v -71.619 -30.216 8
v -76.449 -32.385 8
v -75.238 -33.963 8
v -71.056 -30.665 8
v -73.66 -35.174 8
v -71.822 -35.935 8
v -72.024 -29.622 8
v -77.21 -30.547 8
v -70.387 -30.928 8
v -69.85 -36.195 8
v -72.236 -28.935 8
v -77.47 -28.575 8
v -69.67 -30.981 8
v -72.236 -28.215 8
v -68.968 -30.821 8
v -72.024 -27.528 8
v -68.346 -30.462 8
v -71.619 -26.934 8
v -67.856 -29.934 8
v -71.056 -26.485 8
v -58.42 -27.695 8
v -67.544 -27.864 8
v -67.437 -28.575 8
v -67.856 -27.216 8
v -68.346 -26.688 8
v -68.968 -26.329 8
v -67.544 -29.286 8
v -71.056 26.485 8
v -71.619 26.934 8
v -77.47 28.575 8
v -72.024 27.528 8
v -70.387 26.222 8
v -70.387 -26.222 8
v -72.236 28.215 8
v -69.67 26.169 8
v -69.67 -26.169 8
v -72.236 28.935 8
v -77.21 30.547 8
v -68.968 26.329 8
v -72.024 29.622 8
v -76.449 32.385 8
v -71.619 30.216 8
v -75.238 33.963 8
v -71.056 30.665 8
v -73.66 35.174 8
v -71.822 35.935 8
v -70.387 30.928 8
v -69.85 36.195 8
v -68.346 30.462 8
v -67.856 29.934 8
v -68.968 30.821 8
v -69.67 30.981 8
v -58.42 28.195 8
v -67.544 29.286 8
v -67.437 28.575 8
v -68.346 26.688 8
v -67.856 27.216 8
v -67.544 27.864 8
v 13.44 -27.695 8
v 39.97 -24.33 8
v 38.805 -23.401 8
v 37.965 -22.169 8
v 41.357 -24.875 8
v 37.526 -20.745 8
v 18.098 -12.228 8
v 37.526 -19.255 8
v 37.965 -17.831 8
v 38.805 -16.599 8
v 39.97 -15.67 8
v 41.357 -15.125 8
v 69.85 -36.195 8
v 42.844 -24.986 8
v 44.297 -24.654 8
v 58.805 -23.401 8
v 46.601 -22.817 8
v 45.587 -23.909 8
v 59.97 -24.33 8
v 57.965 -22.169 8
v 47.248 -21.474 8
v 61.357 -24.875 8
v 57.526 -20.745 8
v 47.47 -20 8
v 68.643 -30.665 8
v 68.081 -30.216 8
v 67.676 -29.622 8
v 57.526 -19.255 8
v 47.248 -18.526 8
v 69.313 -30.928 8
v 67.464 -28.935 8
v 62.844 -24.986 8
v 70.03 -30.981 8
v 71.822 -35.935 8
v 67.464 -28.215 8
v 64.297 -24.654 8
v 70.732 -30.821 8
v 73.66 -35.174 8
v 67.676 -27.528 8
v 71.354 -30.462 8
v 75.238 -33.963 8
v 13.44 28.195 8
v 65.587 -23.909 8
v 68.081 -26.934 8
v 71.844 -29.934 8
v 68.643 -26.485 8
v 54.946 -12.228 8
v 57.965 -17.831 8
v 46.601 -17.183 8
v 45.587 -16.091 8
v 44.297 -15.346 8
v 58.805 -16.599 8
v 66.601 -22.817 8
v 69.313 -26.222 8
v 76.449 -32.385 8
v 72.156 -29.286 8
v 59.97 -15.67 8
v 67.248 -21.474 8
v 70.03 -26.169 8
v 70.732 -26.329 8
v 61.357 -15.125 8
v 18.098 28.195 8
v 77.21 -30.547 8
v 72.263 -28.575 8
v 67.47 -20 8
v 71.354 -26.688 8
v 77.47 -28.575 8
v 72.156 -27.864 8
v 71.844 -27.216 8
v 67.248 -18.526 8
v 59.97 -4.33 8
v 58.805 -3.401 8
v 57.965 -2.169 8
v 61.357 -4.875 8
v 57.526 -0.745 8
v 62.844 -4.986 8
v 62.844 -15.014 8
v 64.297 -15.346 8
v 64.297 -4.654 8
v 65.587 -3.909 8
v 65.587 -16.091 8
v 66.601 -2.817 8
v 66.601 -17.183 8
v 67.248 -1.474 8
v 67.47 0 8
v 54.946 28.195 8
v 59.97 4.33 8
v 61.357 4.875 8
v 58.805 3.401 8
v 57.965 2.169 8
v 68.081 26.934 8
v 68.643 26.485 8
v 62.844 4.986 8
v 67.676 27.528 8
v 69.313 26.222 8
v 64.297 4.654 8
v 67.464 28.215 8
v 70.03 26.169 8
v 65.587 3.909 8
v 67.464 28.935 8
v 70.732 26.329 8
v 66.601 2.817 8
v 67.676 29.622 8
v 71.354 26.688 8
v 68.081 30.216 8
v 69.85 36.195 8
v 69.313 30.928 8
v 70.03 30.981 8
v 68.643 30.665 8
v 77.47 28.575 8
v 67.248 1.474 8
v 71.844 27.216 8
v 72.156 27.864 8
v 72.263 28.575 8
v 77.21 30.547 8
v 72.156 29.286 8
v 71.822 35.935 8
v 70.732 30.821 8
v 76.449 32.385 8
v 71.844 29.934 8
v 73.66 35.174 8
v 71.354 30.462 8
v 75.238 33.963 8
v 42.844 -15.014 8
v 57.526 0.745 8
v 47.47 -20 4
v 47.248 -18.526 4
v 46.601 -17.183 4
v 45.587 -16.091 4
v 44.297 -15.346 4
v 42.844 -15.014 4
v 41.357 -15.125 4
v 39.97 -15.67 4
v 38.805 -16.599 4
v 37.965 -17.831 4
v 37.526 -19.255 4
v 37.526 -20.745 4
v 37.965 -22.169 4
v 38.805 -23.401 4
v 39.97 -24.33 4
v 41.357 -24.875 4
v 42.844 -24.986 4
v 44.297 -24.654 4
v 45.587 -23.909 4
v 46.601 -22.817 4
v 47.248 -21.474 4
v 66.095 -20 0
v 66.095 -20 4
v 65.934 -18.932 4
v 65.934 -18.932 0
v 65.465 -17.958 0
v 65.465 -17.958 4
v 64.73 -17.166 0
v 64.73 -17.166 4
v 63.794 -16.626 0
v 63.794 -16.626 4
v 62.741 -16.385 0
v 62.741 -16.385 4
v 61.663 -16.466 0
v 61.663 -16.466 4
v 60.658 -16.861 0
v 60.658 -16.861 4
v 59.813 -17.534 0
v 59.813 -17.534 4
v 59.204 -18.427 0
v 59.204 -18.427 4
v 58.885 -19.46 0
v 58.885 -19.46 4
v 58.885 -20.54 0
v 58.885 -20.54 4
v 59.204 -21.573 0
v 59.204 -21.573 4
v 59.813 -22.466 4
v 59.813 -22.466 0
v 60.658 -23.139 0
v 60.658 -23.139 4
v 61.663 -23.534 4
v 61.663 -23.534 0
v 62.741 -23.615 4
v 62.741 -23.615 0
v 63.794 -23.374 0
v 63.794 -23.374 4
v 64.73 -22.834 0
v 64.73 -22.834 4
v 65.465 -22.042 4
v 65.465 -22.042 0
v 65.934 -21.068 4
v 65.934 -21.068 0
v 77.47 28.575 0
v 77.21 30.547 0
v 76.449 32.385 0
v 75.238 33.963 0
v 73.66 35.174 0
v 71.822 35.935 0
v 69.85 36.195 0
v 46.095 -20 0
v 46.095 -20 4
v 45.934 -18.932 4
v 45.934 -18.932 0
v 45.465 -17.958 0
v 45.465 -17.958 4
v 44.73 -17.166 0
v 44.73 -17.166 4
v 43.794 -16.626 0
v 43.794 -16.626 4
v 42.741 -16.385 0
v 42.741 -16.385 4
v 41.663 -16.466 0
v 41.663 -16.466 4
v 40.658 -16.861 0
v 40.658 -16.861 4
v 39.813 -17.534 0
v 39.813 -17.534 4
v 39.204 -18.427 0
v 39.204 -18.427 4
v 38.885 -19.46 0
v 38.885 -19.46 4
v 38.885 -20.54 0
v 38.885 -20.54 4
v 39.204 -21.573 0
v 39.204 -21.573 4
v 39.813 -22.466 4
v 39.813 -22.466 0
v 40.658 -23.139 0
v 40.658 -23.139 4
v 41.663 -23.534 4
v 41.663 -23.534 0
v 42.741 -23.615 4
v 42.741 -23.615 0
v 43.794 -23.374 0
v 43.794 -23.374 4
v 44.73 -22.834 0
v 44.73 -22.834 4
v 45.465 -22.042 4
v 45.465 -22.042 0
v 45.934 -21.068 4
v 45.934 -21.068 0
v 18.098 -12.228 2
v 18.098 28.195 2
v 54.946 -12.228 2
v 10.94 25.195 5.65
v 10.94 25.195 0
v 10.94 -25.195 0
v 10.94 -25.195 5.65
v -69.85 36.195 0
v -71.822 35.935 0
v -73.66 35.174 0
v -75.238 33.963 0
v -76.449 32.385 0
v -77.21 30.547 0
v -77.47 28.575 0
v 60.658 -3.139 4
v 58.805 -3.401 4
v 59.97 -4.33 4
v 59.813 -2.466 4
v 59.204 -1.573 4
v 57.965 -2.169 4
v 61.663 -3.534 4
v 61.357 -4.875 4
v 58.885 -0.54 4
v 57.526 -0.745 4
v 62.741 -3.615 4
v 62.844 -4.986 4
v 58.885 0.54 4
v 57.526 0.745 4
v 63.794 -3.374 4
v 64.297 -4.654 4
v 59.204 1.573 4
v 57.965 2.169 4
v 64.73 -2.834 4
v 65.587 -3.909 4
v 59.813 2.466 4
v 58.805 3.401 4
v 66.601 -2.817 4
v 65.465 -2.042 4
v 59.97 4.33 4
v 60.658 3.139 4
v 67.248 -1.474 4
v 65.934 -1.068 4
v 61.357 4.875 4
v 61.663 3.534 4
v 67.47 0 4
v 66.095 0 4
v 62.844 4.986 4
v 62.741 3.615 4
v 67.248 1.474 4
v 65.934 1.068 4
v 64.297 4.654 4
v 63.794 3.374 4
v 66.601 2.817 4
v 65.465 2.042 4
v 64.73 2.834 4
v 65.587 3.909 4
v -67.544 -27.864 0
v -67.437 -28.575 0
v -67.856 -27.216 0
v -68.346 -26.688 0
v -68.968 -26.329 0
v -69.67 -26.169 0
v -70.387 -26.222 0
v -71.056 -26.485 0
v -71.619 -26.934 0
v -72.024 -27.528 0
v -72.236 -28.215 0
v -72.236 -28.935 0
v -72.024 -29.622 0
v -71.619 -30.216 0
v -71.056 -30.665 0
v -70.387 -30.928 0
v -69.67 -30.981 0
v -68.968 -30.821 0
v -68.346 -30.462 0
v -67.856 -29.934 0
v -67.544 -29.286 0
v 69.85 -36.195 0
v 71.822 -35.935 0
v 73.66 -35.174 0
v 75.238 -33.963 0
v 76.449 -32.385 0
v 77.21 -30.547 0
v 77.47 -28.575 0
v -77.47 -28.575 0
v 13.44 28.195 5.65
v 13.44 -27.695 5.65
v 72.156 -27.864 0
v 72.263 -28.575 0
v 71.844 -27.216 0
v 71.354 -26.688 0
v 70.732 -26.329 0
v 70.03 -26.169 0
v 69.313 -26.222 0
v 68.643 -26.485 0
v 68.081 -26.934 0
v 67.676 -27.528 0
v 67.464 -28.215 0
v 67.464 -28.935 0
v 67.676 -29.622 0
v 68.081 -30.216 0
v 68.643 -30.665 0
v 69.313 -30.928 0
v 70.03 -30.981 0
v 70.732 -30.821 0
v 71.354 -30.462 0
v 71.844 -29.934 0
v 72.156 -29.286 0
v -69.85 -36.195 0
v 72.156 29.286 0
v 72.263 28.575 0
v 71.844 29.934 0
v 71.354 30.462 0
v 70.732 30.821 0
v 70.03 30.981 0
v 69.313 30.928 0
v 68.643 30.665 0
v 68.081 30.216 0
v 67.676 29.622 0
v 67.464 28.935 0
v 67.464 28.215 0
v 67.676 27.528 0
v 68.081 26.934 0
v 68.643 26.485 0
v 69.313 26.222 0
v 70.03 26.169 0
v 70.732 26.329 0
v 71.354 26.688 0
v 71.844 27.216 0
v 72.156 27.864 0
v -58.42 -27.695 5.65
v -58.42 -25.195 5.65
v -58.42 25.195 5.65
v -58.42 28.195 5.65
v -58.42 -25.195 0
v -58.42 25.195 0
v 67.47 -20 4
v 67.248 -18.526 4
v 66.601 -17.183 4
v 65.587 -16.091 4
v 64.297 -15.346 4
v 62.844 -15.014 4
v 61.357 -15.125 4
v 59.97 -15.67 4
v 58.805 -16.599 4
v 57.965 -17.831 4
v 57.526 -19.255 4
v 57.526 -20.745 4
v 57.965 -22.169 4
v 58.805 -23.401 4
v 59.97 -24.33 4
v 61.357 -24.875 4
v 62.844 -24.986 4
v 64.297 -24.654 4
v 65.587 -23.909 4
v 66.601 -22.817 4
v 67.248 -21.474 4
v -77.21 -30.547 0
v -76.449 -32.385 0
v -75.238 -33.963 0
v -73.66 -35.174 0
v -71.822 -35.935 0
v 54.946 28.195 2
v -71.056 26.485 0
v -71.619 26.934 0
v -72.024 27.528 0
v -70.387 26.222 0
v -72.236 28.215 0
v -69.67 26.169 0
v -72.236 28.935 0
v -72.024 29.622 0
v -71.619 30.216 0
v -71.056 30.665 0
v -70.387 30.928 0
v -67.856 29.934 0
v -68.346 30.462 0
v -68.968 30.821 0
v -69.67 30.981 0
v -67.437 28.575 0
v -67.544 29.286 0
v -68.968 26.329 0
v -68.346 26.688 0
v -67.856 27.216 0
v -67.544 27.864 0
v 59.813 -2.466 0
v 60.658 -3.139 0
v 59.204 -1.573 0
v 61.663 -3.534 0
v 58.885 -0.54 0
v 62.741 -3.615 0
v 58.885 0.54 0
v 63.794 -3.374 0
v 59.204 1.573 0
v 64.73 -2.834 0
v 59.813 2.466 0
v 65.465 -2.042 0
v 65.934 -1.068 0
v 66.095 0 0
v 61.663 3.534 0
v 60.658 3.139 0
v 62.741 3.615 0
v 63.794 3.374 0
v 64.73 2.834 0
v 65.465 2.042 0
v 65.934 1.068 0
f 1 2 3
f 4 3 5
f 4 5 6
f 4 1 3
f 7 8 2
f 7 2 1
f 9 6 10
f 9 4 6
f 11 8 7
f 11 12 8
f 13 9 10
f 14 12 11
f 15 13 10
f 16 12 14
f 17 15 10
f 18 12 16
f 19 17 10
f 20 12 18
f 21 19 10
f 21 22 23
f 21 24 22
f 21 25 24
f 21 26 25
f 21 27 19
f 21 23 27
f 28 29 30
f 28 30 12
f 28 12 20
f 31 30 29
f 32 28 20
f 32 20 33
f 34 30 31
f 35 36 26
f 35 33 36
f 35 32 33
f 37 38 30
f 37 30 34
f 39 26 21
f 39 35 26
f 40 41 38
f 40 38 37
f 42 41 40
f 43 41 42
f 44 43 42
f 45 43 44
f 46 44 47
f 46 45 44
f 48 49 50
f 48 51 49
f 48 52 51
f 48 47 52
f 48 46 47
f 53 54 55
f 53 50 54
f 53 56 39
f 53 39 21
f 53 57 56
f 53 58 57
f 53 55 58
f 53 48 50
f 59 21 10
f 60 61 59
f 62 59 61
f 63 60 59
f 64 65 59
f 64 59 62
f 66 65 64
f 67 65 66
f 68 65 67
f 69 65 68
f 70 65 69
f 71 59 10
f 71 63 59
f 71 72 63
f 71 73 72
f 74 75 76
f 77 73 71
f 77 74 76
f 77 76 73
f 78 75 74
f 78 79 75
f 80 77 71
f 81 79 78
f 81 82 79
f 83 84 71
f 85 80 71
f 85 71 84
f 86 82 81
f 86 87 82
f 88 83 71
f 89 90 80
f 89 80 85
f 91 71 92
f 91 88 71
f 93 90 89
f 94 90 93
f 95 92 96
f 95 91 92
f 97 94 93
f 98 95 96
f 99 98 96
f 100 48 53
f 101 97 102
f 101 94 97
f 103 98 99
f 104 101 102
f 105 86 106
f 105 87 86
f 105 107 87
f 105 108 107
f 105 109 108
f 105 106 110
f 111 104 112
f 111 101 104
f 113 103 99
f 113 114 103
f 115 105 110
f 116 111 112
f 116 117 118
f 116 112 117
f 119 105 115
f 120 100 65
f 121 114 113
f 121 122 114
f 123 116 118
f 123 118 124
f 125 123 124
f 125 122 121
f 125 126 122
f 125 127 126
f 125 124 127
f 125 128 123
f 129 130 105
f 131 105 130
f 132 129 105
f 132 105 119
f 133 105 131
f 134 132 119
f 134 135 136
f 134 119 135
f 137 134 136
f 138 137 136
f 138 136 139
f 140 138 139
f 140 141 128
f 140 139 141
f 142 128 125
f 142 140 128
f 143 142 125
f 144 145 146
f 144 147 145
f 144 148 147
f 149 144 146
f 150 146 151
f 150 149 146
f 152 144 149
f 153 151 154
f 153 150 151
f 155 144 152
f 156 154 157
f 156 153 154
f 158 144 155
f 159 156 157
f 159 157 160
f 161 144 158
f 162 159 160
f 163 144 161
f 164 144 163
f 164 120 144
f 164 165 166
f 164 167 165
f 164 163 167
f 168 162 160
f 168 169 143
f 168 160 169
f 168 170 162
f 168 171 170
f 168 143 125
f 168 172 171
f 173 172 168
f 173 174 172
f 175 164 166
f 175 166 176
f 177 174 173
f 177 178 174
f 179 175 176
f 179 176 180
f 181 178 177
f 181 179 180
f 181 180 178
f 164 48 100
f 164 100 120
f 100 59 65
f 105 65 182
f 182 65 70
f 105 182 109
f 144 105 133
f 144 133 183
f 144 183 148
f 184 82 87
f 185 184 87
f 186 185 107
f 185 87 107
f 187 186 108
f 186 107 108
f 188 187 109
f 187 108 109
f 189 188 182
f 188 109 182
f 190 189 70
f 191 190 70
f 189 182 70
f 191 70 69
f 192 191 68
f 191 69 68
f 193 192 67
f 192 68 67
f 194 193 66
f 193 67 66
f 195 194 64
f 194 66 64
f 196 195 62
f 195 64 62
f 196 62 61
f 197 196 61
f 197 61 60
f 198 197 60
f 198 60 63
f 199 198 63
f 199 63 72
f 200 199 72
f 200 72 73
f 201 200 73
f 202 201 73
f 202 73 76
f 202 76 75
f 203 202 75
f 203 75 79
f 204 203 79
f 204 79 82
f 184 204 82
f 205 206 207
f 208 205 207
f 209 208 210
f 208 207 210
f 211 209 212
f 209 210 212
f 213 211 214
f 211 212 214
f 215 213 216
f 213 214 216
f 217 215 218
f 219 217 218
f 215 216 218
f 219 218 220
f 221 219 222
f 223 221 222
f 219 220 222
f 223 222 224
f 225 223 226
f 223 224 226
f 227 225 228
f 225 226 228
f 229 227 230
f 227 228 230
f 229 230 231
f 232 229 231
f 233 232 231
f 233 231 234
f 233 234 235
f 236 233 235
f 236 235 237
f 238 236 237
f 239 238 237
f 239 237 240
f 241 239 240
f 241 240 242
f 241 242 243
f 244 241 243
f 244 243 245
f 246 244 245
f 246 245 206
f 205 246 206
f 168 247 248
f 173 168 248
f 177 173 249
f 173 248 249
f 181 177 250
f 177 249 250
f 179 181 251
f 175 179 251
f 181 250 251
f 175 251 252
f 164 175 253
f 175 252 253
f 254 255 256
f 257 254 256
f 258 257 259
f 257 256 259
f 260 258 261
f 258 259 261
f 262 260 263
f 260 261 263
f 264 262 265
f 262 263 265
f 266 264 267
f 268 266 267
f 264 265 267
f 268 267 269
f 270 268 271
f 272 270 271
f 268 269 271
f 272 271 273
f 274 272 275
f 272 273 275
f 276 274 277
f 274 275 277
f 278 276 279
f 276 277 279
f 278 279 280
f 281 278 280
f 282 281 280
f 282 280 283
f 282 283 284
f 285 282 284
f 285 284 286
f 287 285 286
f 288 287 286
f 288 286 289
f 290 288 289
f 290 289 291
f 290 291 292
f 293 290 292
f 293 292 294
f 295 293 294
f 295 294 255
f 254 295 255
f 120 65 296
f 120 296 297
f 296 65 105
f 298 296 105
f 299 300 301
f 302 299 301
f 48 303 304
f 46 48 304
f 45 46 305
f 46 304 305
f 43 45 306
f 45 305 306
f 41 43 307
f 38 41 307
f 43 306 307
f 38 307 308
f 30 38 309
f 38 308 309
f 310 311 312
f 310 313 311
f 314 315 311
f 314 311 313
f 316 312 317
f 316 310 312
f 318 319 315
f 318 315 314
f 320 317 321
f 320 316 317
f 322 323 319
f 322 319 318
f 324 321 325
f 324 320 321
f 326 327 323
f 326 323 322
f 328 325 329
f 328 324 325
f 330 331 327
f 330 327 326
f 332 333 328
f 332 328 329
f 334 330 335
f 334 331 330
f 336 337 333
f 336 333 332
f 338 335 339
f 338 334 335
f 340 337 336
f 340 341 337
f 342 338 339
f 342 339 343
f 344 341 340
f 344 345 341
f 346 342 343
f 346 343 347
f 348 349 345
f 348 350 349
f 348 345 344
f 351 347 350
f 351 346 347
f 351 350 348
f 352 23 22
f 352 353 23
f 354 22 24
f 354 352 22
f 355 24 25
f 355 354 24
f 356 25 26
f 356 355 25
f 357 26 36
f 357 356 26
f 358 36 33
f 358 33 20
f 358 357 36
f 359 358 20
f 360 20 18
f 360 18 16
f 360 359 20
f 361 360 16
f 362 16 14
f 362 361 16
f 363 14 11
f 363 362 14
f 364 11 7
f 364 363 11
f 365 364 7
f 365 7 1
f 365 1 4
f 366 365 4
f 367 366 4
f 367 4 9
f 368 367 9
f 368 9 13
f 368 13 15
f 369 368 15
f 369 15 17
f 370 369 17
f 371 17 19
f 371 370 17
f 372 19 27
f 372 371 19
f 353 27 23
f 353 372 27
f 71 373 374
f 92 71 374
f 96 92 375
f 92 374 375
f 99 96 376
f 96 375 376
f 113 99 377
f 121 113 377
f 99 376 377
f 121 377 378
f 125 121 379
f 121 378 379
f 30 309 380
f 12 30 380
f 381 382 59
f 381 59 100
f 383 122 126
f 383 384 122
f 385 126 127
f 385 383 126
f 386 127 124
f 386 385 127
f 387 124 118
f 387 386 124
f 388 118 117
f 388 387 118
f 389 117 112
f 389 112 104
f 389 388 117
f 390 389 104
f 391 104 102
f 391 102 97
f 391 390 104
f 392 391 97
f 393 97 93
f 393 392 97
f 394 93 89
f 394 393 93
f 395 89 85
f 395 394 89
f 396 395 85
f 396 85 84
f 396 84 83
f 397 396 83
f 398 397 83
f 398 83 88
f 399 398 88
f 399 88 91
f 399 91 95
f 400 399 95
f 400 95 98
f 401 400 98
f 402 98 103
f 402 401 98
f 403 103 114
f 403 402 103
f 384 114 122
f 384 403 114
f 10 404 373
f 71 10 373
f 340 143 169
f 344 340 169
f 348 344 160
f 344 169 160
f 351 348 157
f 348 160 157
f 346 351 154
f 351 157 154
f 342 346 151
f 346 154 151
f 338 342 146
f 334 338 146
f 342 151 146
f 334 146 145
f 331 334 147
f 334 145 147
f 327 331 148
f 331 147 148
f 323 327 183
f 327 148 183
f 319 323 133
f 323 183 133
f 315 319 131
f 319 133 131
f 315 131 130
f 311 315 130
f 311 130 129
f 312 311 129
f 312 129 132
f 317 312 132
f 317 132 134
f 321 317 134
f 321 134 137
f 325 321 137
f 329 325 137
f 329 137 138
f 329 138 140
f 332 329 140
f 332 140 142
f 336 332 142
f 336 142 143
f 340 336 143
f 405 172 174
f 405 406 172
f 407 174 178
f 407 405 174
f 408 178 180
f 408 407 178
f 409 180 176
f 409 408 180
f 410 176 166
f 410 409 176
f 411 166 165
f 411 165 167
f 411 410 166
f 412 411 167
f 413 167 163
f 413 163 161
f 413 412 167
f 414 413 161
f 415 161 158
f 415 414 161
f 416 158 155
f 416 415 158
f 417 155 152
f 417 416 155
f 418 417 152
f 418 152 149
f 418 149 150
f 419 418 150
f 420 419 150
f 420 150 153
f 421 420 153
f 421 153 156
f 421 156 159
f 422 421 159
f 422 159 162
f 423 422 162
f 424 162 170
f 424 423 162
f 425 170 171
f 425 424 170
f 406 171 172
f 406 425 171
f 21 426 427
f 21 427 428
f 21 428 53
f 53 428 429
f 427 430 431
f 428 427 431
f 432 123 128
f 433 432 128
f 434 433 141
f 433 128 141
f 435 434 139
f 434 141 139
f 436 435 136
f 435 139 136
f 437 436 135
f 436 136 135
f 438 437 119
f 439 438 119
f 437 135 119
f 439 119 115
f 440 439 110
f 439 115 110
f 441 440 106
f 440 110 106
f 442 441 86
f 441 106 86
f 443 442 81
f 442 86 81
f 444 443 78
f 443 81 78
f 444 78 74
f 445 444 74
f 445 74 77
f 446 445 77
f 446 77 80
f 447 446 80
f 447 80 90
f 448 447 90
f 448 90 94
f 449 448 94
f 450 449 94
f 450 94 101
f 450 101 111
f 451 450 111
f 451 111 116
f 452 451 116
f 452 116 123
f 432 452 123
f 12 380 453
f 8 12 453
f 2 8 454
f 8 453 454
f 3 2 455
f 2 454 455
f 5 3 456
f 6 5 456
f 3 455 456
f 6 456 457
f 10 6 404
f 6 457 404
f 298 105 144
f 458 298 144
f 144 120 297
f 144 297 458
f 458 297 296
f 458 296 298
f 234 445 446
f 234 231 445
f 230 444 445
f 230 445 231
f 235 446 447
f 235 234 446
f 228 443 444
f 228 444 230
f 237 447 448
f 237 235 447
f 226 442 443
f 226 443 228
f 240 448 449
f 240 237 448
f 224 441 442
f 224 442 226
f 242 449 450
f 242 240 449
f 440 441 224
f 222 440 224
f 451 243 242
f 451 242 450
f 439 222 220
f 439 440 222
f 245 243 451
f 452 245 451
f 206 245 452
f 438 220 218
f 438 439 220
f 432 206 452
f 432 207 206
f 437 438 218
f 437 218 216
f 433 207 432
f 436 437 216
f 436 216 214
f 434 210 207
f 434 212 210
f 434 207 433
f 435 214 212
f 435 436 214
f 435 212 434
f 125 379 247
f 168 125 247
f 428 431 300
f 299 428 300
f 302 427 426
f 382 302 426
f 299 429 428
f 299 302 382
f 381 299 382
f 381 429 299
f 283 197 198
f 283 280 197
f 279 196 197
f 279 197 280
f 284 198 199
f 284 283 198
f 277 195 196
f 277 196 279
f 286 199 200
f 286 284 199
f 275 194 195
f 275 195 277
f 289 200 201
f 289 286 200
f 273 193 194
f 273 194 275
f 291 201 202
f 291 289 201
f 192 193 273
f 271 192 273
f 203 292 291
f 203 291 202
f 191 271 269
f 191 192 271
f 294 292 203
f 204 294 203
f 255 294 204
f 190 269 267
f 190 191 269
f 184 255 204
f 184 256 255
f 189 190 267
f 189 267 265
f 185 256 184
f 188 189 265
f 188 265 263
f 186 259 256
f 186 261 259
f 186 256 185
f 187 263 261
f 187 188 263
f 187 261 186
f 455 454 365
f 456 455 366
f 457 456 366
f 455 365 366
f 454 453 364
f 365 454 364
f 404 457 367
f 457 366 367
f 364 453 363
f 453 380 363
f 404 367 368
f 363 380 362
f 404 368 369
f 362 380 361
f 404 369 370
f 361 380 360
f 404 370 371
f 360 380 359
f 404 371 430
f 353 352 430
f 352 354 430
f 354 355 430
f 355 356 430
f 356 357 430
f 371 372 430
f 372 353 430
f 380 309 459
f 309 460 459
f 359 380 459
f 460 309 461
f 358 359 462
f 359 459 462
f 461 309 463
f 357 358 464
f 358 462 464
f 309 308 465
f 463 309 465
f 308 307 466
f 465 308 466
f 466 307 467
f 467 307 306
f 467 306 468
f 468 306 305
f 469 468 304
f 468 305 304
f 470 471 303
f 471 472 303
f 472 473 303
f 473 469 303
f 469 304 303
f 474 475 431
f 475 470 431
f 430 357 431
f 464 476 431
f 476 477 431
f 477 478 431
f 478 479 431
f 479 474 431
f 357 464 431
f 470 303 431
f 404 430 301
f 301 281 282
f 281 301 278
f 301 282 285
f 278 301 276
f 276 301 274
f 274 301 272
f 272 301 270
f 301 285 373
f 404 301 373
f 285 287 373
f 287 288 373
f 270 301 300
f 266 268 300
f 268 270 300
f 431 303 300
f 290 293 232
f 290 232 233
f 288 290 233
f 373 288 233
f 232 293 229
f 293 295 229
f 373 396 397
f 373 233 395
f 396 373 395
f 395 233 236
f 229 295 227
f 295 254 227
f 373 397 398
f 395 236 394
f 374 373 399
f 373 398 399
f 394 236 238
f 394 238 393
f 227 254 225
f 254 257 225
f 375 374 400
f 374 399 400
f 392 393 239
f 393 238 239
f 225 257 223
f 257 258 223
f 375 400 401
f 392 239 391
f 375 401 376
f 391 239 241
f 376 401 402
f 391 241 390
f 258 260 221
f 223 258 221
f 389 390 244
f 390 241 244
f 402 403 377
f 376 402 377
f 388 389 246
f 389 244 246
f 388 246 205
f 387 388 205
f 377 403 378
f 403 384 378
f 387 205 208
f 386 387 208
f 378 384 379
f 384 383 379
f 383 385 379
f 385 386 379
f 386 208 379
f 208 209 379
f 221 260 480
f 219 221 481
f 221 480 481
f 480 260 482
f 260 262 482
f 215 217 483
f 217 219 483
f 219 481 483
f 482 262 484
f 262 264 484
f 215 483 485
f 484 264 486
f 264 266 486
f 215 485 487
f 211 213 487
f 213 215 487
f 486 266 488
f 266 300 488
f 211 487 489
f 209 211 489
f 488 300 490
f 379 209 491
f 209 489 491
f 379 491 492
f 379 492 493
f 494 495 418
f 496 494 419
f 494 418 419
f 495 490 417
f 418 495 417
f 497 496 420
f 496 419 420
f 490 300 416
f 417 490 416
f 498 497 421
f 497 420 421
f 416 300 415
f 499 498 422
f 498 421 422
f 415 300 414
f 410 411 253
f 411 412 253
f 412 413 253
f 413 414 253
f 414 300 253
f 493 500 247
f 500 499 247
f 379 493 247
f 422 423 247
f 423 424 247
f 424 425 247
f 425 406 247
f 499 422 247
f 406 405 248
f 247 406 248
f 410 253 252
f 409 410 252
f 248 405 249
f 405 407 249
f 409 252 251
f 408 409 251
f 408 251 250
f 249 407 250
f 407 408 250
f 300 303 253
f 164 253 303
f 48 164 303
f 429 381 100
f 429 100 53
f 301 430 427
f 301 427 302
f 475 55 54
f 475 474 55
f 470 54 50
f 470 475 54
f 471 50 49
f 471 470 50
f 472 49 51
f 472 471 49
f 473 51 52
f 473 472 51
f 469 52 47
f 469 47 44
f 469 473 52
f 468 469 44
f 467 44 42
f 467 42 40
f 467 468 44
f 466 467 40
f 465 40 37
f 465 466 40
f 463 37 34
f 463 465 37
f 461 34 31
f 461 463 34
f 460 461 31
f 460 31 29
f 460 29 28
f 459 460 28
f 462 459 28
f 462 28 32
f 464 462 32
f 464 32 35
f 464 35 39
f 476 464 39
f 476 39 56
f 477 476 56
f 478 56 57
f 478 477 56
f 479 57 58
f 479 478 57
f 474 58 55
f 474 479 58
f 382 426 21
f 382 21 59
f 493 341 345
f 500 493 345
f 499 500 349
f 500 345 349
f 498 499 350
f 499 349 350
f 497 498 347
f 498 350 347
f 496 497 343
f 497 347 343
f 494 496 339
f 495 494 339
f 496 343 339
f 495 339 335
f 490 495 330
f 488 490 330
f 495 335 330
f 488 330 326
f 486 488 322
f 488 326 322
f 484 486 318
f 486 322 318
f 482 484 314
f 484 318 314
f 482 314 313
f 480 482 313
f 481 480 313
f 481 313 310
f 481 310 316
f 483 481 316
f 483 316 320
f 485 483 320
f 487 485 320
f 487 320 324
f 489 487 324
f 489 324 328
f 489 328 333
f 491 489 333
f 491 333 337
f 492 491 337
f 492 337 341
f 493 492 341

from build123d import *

# Parameters (mm, degrees)
F0_R      = 2.413
F1_DEPTH  = 8
F2_W      = 69.36
F2_H      = 50.39
F3_DEPTH  = 25.4
F4_W      = 69.36
F4_H      = 50.39
F5_DEPTH  = 2.35
F6_DEPTH  = 2
F7_R      = 5
F8_DEPTH  = 6
F9_R      = 3.625
F10_DEPTH = 25.4
F11_R     = 3.625
F12_DEPTH = 25.4
F13_R     = 3.625
F14_DEPTH = 25.4
F15_R     = 2.413
F15_R_2   = 5
F15_W     = 71.86
F15_H     = 55.89
F16_DEPTH = 2
F17_W     = 36.8478260934
F17_H     = 40.4230296794
F18_DEPTH = 6


with BuildPart() as f1:
    # F0 (on Top) → F1 (new body)
    with BuildSketch(Plane.XY):
        with BuildLine():
            ThreePointArc((-69.85, 36.195), (-75.2381536726, 33.9631536726), (-77.47, 28.575))
            Line((-77.47, 28.575), (-77.47, 0))
            Line((-77.47, 0), (-77.47, -28.575))
            ThreePointArc((-77.47, -28.575), (-75.2381536726, -33.9631536726), (-69.85, -36.195))
            Line((-69.85, -36.195), (0, -36.195))
            Line((0, -36.195), (69.85, -36.195))
            ThreePointArc((69.85, -36.195), (75.2381536726, -33.9631536726), (77.47, -28.575))
            Line((77.47, -28.575), (77.47, 0))
            Line((77.47, 0), (77.47, 28.575))
            ThreePointArc((77.47, 28.575), (75.2381536726, 33.9631536726), (69.85, 36.195))
            Line((69.85, 36.195), (0, 36.195))
            Line((0, 36.195), (-69.85, 36.195))
        make_face()
        with Locations((-69.85, -28.575)):
            Circle(F0_R, mode=Mode.SUBTRACT)
        with Locations((69.85, -28.575)):
            Circle(F0_R, mode=Mode.SUBTRACT)
        with Locations((-69.85, 28.575)):
            Circle(F0_R, mode=Mode.SUBTRACT)
        with Locations((69.85, 28.575)):
            Circle(F0_R, mode=Mode.SUBTRACT)
    extrude(amount=F1_DEPTH)

    # F2 (on face) → F3 (cut)
    with BuildSketch(Plane(origin=(0, 0, 0), x_dir=(1, 0, 0), z_dir=(0, 0, -1))):
        with Locations((-23.74, 0.000232)):
            Rectangle(F2_W, F2_H)
    extrude(amount=-F3_DEPTH, mode=Mode.SUBTRACT)

    # F4 (on face) → F5 (cut)
    with BuildSketch(Plane.XY.offset(8)):
        with Locations((-23.74, -0.000232)):
            Rectangle(F4_W, F4_H)
        Polygon((-58.42, -25.195232), (-58.42, -27.695232), (13.44, -27.695232), (13.44, 28.194768), (-58.42, 28.194768), (-58.42, 25.194768), (10.94, 25.194768), (10.94, -25.195232), align=None)
    extrude(amount=-F5_DEPTH, mode=Mode.SUBTRACT)

    # F6 (add): a face of the model
    f6_faces = [f1.faces().sort_by_distance(p)[0] for p in [
        (-74.0288829068, 32.7538829068, 8),
    ]]
    extrude(f6_faces, amount=F6_DEPTH)

    # F7 (on face) → F8 (cut)
    with BuildSketch(Plane.XY.offset(10)):
        with Locations((62.47, -20)):
            Circle(F7_R)
        with Locations((42.47, -20)):
            Circle(F7_R)
        with Locations((62.47, 0)):
            Circle(F7_R)
    extrude(amount=-F8_DEPTH, mode=Mode.SUBTRACT)

    # F9 (on face) → F10 (cut)
    with BuildSketch(Plane.XY.offset(4)):
        with Locations((62.47, 0)):
            Circle(F9_R)
    extrude(amount=-F10_DEPTH, mode=Mode.SUBTRACT)

    # F11 (on face) → F12 (cut)
    with BuildSketch(Plane.XY.offset(4)):
        with Locations((62.47, -20)):
            Circle(F11_R)
    extrude(amount=-F12_DEPTH, mode=Mode.SUBTRACT)

    # F13 (on face) → F14 (cut)
    with BuildSketch(Plane.XY.offset(4)):
        with Locations((42.47, -20)):
            Circle(F13_R)
    extrude(amount=-F14_DEPTH, mode=Mode.SUBTRACT)

    # F15 (on face) → F16 (cut)
    with BuildSketch(Plane.XY.offset(10)):
        with BuildLine():
            Line((69.85, 36.195), (-69.85, 36.195))
            ThreePointArc((-69.85, 36.195), (-75.2381536726, 33.9631536726), (-77.47, 28.575))
            Line((-77.47, 28.575), (-77.47, -28.575))
            ThreePointArc((-77.47, -28.575), (-75.2381536726, -33.9631536726), (-69.85, -36.195))
            Line((-69.85, -36.195), (69.85, -36.195))
            ThreePointArc((69.85, -36.195), (75.2381536726, -33.9631536726), (77.47, -28.575))
            Line((77.47, -28.575), (77.47, 28.575))
            ThreePointArc((77.47, 28.575), (75.2381536726, 33.9631536726), (69.85, 36.195))
        make_face()
        with Locations((-69.85, -28.575)):
            Circle(F15_R, mode=Mode.SUBTRACT)
        with Locations((69.85, -28.575)):
            Circle(F15_R, mode=Mode.SUBTRACT)
        with Locations((42.47, -20)):
            Circle(F15_R_2, mode=Mode.SUBTRACT)
        with Locations((62.47, -20)):
            Circle(F15_R_2, mode=Mode.SUBTRACT)
        with Locations((-22.49, 0.249768)):
            Rectangle(F15_W, F15_H, mode=Mode.SUBTRACT)
        with Locations((-69.85, 28.575)):
            Circle(F15_R, mode=Mode.SUBTRACT)
        with Locations((62.47, 0)):
            Circle(F15_R_2, mode=Mode.SUBTRACT)
        with Locations((69.85, 28.575)):
            Circle(F15_R, mode=Mode.SUBTRACT)
    extrude(amount=-F16_DEPTH, mode=Mode.SUBTRACT)

    # F17 (on face) → F18 (cut)
    with BuildSketch(Plane.XY.offset(8)):
        with Locations((36.5217383951, 7.9832531603)):
            Rectangle(F17_W, F17_H)
    extrude(amount=-F18_DEPTH, mode=Mode.SUBTRACT)


solid = f1.part
